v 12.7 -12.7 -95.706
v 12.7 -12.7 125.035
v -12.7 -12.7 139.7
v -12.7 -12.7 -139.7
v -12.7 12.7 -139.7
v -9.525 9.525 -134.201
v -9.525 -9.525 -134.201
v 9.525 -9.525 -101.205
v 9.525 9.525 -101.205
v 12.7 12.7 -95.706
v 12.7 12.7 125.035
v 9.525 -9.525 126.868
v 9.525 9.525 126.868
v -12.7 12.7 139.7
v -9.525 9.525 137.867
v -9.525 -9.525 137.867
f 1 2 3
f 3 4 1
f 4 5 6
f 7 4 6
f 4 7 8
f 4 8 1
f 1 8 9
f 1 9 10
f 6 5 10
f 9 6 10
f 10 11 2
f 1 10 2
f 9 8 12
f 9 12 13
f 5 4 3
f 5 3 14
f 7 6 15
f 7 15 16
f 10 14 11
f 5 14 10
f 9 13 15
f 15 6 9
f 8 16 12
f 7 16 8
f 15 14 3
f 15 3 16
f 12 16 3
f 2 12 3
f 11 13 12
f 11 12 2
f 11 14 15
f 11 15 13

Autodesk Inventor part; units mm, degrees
ref_plane "YZ Plane" through (0, 0, 0) normal (1, 0, 0) x (0, 1, 0)
ref_plane "XZ Plane" through (0, 0, 0) normal (0, 1, 0) x (-1, 0, 0)
ref_plane "XY Plane" through (0, 0, 0) normal (0, 0, 1) x (1, 0, 0)
sketch "Sketch1" plane through (0, 0, 0) normal (0, 0, 1) x (1, 0, 0)
  line L0 (-17.78, 0) -> (17.78, 0) projected
  line L1 (0, -17.78) -> (0, 17.78) projected
  line L2 (-12.7, 12.7) -> (12.7, 12.7)
  line L3 (12.7, 12.7) -> (12.7, -12.7)
  line L4 (12.7, -12.7) -> (-12.7, -12.7)
  line L5 (-12.7, -12.7) -> (-12.7, 12.7)
  line L6 (9.525, 9.525) -> (-9.525, 9.525)
  line L7 (-9.525, 9.525) -> (-9.525, -9.525)
  line L8 (-9.525, -9.525) -> (9.525, -9.525)
  line L9 (9.525, -9.525) -> (9.525, 9.525)
  point P0 (0, 0)
  point P1 (-12.7, 0)
  point P2 (0, 12.7)
  dimension "d0" = 25.4
  dimension "d1" = 3.175
extrude "Extrusion1" add sketch "Sketch1" along normal mid plane 279.4 contours L5 L2 L1 L6 L7 L0 | L0 L7 L8 L1 L4 L5 | L1 L8 L9 L0 L3 L4 | L2 L3 L0 L9 L6 L1
sketch "Sketch3" plane through (-12.7, 12.7, 139.7) normal (0, 1, 0) x (1, 0, 0)
  line L0 (0, 0) -> (25.4, 0) projected
  line L1 (25.4, 0) -> (25.4, 279.4) projected
  line L2 (0, 0) -> (25.4, 14.6647)
  point P0 (12.7, 139.7)
  dimension "d7" = 30
extrude "Extrusion3" cut sketch "Sketch3" against normal through all
sketch "Sketch4" plane through (-12.7, 12.7, -139.7) normal (0, 1, 0) x (1, 0, 0)
  line L0 (25.4, -264.7353) -> (25.4, 0) projected
  line L1 (25.4, 0) -> (0, 0) projected
  line L2 (0, 0) -> (25.4, -43.9941)
  point P0 (12.7, -139.7)
  dimension "d10" = 60
extrude "Extrusion4" cut sketch "Sketch4" against normal through all
properties part number "tubing_template_0.125" material "Aluminum-6061"
